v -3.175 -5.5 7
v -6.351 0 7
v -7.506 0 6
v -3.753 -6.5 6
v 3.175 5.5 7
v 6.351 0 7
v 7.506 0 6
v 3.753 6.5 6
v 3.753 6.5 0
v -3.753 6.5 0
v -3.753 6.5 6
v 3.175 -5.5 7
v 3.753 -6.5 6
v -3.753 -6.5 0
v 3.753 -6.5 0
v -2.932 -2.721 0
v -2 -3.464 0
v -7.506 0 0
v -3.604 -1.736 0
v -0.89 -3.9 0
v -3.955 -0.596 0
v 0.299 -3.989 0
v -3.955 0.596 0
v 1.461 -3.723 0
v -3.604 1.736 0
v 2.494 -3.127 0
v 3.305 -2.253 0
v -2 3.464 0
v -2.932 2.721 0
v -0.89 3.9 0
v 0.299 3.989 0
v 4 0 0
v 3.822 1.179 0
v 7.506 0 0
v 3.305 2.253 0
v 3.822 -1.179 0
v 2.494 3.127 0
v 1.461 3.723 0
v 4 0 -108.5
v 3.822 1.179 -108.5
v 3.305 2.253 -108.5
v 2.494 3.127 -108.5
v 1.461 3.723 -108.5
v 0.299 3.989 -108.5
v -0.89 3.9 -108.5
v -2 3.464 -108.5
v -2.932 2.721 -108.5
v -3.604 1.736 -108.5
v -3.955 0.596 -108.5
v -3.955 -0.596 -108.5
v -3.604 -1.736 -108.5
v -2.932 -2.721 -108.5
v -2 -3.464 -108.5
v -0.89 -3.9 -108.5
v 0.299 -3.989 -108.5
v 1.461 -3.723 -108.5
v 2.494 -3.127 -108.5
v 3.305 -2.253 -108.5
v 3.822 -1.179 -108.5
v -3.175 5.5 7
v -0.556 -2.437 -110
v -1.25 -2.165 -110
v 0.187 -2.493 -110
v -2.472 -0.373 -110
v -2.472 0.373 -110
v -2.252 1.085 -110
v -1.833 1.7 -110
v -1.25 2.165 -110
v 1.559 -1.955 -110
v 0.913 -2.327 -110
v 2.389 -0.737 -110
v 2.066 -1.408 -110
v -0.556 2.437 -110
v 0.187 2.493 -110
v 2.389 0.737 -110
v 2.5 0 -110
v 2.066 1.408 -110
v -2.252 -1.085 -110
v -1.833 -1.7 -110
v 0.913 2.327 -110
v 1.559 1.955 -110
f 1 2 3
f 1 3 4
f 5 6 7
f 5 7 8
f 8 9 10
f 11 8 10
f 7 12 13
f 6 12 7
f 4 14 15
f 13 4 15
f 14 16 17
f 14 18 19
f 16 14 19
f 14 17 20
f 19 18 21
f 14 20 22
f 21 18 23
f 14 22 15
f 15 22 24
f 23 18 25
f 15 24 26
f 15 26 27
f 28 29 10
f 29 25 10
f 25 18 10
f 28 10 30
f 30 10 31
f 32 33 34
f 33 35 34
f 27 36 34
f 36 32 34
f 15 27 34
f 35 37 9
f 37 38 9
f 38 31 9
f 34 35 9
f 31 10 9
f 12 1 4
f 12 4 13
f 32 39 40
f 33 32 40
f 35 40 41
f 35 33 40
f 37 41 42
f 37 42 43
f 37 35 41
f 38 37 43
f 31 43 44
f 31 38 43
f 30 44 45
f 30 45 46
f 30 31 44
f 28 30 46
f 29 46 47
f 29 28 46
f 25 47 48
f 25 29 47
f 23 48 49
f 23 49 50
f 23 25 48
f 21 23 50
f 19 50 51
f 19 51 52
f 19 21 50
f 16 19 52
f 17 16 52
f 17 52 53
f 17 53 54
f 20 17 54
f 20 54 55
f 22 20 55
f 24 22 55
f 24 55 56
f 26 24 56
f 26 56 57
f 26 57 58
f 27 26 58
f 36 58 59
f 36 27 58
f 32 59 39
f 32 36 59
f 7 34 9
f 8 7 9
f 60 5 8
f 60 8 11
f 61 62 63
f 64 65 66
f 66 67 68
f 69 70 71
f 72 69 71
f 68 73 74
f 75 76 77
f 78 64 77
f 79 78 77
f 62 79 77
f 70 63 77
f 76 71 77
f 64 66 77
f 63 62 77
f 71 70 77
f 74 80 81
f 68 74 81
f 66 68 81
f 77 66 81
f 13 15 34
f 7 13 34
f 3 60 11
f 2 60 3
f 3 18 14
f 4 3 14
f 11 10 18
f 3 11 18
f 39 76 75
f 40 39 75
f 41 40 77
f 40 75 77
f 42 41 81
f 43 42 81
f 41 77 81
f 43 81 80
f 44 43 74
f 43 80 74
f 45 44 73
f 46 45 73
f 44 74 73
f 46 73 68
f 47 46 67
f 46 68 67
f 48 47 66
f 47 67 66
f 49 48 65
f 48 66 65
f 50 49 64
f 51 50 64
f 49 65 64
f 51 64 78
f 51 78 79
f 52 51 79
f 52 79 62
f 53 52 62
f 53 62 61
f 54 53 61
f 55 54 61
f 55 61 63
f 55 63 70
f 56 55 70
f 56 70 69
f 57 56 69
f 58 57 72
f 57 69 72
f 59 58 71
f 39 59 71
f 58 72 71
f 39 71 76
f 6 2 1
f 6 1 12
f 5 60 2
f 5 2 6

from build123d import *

# Parameters (mm, degrees)
F0_R     = 4
F1_DEPTH = 7
F2_DEPTH = 110
F3_SIZE  = 1.5
F4_SIZE2 = 1
F4_SIZE  = 1


with BuildPart() as f1:
    # F0 (on Top) → F1 (new body)
    with BuildSketch(Plane.XY):
        Polygon((3.752777, 6.5), (-3.752777, 6.5), (-7.505553, 0), (-3.752777, -6.5), (3.752777, -6.5), (7.505553, 0), align=None)
        Circle(F0_R, mode=Mode.SUBTRACT)
        Circle(F0_R)
    extrude(amount=F1_DEPTH)

    # F0 (on Top) → F2 (join)
    with BuildSketch(Plane.XY):
        Circle(F0_R)
    extrude(amount=-F2_DEPTH)

    # F3
    f3_edges = [f1.edges().sort_by_distance(p)[0] for p in [
        (-4, 0, -110),
    ]]
    chamfer(f3_edges, length=F3_SIZE)

    # F4
    f4_edges = [f1.edges().sort_by_distance(p)[0] for p in [
        (5.629165, 3.25, 7),
        (0, 6.5, 7),
        (-5.629165, 3.25, 7),
        (-5.629165, -3.25, 7),
        (0, -6.5, 7),
        (5.629165, -3.25, 7),
    ]]
    chamfer(f4_edges, length=F4_SIZE, length2=F4_SIZE2)


solid = f1.part
